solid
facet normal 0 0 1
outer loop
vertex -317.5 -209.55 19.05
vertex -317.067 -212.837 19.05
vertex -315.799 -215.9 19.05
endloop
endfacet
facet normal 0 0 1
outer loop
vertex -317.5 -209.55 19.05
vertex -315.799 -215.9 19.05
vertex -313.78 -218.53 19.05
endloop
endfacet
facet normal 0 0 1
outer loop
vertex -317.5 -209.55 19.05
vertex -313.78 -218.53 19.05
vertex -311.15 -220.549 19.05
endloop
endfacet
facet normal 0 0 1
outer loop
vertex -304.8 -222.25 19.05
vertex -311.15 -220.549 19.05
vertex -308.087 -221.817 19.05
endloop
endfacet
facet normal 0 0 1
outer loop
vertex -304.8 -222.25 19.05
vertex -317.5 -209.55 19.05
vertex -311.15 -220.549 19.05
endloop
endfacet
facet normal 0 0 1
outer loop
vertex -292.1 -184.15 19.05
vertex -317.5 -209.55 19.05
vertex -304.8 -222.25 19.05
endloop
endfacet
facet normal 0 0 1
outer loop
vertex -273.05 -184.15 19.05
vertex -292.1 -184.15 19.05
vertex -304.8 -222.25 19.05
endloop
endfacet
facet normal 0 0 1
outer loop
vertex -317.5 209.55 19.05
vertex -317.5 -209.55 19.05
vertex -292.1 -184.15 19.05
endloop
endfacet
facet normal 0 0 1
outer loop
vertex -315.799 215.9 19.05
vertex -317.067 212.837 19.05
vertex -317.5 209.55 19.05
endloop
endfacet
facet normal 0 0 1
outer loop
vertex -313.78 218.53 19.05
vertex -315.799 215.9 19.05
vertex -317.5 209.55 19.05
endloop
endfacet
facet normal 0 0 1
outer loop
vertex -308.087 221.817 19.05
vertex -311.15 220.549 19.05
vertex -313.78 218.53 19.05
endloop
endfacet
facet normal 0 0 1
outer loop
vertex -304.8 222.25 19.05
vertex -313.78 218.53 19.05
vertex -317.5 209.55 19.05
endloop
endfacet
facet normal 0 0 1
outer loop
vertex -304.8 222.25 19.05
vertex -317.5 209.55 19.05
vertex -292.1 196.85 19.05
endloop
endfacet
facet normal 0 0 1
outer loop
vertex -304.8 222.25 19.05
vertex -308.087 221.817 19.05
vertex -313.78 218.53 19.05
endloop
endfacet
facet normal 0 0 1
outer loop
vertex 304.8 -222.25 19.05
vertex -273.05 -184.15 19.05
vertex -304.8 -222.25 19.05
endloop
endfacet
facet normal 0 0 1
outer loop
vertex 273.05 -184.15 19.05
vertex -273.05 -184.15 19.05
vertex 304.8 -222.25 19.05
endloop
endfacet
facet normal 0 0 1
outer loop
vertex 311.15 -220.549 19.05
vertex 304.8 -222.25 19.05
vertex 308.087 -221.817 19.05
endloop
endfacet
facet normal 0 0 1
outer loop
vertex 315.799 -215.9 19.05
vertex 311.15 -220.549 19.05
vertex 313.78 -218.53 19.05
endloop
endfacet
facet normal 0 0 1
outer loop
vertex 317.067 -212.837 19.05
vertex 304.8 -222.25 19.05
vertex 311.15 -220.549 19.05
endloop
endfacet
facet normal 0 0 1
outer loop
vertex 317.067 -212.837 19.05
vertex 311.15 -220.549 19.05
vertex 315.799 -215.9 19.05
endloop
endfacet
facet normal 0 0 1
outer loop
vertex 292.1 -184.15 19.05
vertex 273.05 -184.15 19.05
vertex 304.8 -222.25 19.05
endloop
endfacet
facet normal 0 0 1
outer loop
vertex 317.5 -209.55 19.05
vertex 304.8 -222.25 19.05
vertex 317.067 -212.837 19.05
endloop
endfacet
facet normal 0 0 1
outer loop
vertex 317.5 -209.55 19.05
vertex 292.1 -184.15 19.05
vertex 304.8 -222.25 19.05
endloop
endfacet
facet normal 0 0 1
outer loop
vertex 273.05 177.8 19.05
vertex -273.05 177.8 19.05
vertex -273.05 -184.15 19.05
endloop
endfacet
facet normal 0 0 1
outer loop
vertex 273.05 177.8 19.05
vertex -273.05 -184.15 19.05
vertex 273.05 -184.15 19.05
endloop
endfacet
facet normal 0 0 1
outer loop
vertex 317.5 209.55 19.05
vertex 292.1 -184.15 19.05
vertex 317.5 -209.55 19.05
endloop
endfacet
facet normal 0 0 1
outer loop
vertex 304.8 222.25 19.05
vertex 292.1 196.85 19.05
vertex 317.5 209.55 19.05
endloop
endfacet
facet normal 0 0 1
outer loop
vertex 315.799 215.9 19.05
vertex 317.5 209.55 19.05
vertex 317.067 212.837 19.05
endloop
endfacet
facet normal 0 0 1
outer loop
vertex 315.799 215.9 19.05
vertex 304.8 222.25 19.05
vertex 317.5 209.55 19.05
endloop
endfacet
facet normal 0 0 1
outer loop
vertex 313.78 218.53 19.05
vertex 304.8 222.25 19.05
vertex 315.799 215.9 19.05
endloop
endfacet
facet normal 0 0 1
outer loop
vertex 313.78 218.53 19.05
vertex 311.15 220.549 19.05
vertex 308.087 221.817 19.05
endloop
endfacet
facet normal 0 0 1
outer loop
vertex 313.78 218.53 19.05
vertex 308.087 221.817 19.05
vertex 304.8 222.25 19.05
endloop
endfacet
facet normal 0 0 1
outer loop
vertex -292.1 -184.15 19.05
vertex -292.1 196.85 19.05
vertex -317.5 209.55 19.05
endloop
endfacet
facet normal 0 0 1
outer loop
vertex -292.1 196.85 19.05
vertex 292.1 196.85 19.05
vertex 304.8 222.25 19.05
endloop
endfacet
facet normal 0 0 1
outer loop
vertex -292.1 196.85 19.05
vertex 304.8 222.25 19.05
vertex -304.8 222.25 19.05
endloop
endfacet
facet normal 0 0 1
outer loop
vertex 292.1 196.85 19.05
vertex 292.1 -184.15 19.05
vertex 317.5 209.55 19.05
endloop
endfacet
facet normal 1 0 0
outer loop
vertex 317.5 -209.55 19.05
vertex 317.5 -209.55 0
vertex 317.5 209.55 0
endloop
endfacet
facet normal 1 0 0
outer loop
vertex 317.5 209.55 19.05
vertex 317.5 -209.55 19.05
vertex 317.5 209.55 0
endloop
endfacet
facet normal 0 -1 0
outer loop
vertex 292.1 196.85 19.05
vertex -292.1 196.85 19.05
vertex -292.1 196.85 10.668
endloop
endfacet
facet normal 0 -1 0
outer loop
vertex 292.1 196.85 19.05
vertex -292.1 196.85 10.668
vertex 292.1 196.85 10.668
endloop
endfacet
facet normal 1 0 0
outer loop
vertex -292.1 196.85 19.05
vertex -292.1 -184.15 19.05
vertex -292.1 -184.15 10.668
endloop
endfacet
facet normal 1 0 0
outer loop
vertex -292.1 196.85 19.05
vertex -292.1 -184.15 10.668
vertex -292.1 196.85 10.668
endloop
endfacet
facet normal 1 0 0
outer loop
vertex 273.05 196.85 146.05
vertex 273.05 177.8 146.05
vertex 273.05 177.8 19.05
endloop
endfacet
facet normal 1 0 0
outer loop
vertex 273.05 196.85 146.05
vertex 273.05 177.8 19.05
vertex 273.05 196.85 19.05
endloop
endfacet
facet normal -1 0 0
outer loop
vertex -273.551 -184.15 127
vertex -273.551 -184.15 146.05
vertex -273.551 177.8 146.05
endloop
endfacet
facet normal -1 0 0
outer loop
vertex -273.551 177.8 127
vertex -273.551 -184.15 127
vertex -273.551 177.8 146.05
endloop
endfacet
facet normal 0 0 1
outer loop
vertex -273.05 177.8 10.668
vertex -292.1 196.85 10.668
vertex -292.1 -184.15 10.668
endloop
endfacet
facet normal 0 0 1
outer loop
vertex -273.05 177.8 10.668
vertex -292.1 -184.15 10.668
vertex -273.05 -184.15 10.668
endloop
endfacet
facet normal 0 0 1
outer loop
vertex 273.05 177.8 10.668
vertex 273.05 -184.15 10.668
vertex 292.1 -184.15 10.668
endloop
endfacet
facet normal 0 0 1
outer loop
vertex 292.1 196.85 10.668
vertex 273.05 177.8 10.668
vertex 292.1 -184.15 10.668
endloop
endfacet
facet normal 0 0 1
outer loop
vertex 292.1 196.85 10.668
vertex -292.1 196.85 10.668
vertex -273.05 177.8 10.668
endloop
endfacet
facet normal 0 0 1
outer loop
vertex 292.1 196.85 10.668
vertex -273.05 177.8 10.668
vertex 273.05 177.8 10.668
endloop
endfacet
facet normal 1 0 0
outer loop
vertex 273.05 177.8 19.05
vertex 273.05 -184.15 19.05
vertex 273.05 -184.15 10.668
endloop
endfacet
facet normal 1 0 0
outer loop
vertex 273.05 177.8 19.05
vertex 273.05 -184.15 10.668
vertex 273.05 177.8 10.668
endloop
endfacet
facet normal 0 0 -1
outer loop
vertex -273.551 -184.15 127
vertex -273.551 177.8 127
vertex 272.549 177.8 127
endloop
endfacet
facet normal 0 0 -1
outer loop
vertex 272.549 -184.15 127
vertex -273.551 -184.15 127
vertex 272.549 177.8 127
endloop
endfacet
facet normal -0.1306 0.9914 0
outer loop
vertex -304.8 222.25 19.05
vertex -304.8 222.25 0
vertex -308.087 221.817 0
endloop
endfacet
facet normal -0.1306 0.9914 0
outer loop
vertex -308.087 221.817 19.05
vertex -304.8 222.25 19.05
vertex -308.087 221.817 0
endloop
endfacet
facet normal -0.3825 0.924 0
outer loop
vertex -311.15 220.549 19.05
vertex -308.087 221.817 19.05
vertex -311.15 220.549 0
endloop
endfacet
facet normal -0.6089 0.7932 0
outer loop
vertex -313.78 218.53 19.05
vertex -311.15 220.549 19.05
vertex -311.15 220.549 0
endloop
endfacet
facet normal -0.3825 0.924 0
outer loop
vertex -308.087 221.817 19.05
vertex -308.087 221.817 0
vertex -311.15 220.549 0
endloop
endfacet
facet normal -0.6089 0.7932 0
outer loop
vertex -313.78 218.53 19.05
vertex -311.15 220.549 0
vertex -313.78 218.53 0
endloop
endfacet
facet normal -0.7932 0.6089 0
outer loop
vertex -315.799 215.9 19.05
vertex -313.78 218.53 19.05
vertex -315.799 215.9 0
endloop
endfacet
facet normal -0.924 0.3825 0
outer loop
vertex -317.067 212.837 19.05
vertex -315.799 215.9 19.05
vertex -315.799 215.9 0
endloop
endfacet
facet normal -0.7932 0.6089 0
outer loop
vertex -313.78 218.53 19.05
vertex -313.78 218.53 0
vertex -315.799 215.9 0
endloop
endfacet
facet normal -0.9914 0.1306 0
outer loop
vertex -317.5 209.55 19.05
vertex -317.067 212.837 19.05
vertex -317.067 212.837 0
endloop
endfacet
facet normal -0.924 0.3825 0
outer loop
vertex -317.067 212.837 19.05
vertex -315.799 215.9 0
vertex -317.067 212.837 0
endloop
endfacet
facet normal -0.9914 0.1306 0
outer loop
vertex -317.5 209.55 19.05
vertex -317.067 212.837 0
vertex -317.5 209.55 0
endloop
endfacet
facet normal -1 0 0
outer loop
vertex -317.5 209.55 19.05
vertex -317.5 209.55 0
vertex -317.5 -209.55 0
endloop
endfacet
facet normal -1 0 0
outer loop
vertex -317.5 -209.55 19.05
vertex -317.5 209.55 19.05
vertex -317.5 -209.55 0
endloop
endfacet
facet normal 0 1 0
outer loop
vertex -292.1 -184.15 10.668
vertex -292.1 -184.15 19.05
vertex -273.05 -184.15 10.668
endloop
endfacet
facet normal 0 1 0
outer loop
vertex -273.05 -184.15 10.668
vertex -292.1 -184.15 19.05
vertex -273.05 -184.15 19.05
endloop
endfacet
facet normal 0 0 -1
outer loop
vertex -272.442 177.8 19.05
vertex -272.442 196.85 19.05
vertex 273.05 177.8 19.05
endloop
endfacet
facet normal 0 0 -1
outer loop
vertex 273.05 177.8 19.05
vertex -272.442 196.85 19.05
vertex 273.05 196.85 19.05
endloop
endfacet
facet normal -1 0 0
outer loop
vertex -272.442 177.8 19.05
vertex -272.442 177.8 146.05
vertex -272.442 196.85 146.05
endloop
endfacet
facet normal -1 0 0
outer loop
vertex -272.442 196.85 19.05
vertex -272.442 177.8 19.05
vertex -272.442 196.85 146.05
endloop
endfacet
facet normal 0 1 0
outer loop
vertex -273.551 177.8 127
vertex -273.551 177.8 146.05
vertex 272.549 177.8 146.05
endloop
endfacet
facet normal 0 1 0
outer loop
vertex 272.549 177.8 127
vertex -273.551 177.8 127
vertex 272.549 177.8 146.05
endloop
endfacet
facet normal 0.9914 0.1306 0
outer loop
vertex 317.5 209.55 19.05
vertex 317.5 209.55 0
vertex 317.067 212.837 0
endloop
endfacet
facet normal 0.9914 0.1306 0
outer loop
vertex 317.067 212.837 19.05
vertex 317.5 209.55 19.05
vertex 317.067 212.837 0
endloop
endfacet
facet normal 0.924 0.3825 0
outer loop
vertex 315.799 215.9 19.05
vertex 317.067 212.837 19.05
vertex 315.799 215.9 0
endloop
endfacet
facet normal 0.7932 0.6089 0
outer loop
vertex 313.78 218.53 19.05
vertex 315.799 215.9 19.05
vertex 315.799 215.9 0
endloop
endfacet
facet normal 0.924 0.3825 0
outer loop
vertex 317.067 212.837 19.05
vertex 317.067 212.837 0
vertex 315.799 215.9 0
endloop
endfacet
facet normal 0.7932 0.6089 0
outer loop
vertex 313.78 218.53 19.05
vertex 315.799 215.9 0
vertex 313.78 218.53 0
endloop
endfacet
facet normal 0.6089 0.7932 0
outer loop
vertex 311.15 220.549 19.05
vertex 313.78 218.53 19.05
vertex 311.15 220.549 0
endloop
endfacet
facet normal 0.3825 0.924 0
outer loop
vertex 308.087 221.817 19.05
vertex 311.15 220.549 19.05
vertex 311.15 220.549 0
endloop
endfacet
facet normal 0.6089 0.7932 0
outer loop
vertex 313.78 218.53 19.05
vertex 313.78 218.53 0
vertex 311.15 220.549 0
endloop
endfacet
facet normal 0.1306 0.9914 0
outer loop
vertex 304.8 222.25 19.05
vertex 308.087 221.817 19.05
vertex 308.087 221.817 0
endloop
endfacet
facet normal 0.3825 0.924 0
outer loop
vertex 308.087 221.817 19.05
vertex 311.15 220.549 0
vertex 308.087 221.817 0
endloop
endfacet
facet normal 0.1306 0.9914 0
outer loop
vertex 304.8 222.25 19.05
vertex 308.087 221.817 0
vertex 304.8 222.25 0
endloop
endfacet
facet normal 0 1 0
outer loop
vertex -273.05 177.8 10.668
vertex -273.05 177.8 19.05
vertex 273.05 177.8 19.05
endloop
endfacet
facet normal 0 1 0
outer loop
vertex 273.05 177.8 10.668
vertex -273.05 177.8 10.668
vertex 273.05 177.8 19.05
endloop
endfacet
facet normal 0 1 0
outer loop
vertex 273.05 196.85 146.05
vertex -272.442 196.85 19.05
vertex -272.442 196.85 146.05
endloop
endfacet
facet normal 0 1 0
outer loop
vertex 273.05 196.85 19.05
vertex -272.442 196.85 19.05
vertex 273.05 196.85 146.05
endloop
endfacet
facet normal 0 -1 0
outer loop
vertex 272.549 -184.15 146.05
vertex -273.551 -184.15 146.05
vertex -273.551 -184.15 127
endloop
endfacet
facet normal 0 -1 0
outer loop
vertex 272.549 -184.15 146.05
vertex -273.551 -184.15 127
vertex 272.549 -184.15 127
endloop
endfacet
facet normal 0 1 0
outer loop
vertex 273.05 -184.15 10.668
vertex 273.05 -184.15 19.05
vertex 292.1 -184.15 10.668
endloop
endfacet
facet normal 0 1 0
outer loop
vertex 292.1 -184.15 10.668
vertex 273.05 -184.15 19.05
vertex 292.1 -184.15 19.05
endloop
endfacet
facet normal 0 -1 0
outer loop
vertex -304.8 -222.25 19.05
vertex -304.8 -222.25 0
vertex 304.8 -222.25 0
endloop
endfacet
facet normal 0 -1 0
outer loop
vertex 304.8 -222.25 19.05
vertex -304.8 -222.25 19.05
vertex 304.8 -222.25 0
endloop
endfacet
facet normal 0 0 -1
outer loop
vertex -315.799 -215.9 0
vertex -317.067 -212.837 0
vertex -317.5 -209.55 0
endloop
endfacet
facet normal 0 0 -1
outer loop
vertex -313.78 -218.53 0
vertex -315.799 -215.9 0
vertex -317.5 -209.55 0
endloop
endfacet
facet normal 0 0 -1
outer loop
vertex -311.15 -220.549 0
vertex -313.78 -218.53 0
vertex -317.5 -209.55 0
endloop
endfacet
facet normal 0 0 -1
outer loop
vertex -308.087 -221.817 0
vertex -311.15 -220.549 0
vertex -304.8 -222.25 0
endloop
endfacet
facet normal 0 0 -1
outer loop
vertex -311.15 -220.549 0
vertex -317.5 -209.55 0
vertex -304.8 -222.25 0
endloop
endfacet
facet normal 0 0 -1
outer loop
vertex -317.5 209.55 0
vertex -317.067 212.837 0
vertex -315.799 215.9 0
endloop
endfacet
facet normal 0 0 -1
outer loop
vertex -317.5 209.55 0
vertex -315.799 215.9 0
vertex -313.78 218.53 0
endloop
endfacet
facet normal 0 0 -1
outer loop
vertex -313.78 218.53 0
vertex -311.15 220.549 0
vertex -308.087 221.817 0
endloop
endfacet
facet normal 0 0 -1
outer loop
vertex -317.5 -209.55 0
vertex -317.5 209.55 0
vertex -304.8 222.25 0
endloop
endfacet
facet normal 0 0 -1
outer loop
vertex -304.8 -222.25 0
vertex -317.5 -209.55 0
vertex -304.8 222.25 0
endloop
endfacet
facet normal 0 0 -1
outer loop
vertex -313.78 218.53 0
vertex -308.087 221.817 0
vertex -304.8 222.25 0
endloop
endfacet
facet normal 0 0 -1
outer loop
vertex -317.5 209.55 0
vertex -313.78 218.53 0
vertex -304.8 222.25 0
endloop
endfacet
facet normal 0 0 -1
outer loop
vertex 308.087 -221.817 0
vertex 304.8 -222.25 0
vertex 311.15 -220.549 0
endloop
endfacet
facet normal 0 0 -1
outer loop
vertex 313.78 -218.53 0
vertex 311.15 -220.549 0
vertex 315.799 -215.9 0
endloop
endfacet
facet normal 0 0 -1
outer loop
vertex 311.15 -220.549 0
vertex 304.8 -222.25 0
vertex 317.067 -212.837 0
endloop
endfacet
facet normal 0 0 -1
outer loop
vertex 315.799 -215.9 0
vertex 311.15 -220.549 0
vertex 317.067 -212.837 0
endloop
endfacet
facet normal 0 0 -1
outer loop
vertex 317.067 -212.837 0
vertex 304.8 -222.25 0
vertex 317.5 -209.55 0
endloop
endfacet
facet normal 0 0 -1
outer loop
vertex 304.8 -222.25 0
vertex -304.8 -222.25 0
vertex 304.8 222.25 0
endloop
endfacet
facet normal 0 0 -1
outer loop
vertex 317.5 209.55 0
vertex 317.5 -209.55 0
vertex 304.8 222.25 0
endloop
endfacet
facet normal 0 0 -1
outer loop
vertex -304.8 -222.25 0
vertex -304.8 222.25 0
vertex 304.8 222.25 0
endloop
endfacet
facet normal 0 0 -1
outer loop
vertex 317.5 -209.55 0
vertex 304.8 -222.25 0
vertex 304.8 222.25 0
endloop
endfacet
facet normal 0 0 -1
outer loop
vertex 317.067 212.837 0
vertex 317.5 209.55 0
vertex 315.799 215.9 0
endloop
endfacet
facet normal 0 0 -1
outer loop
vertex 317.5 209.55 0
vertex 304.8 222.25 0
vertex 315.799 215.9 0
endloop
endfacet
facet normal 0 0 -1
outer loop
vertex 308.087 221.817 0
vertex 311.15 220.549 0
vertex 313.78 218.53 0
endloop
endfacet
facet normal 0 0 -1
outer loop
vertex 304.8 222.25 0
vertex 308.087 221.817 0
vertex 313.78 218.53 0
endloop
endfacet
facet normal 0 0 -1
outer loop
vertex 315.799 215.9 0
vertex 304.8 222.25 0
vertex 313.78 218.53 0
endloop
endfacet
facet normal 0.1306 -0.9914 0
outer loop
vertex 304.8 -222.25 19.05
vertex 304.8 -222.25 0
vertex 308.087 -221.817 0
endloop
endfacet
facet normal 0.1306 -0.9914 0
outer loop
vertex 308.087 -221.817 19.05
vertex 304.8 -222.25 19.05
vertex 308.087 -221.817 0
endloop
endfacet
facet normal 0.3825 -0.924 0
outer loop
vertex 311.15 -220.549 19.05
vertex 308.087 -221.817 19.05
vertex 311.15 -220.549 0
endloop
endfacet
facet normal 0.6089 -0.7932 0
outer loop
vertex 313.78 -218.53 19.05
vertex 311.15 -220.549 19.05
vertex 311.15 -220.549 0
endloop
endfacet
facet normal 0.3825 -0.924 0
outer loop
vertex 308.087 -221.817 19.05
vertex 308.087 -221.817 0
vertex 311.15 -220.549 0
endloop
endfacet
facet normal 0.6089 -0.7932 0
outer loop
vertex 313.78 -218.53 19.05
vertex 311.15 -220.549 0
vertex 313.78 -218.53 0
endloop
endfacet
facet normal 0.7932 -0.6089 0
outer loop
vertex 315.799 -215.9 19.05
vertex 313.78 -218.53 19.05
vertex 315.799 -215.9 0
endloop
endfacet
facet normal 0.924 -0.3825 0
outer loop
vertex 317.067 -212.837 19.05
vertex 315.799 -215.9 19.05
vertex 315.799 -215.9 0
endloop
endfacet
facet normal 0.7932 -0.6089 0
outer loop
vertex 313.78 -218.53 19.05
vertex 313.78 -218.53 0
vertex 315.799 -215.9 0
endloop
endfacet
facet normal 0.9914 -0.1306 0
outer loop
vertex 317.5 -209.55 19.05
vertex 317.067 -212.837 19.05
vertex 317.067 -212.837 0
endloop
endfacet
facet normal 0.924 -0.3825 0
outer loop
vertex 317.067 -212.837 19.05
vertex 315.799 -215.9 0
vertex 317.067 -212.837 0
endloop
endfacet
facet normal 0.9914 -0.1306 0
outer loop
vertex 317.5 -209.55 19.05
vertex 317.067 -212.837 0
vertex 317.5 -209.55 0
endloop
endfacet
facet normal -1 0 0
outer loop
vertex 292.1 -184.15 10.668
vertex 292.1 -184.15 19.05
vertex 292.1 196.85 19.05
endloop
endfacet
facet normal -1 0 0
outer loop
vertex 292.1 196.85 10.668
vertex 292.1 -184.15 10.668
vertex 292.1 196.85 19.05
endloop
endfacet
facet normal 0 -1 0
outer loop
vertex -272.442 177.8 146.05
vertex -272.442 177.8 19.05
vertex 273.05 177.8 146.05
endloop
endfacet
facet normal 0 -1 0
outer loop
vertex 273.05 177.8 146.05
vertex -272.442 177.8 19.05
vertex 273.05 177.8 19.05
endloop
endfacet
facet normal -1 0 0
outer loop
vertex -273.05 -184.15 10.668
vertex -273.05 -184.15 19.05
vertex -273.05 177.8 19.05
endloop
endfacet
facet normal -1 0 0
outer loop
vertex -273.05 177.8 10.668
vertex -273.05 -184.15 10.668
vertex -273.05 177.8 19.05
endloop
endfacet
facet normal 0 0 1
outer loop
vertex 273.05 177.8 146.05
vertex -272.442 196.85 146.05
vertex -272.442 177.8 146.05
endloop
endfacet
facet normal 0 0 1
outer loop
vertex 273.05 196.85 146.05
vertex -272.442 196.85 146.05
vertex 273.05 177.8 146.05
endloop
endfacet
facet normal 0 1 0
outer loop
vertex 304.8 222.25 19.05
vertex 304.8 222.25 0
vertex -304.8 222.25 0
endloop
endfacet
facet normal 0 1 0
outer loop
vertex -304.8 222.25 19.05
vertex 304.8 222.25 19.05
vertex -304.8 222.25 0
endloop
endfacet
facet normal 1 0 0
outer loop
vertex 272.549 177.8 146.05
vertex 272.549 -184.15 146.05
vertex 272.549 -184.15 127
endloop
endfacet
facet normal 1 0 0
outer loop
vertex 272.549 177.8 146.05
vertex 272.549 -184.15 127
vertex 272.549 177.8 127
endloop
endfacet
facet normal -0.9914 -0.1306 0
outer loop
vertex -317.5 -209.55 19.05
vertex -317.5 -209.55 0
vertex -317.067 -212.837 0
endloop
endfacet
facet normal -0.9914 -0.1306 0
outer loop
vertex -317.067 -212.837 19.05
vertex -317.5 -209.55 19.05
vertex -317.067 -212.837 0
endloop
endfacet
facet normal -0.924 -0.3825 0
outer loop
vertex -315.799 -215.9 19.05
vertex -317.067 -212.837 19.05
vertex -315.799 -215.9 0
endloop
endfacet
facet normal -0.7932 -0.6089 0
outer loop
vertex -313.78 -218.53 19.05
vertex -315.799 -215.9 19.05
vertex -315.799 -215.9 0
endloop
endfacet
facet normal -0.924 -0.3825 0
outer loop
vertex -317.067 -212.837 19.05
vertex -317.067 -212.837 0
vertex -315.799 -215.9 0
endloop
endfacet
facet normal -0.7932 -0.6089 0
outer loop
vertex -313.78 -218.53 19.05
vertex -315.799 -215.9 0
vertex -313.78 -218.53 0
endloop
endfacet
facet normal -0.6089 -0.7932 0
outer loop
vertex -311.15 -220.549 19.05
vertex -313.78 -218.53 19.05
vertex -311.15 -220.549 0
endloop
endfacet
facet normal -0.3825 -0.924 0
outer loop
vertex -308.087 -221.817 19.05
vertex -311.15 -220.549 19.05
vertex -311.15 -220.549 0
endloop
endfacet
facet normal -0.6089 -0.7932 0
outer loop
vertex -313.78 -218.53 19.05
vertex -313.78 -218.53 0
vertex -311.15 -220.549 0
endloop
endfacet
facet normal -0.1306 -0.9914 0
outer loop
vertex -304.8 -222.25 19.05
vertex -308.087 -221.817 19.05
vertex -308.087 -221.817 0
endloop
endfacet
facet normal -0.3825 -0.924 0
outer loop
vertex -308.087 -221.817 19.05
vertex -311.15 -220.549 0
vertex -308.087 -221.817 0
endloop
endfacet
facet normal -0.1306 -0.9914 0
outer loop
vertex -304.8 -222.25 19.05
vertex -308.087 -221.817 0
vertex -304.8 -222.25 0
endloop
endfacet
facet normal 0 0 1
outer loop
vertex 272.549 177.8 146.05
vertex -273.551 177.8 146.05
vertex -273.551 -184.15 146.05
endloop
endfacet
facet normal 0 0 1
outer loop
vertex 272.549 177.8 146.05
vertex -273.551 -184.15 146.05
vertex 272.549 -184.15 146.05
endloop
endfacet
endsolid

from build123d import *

# Parameters (mm, degrees)
F1_DEPTH  = 19.05
F2_W      = 584.2
F2_H      = 19.05
F3_DEPTH  = 8.382
F4_W      = 19.05
F4_H      = 361.95
F5_DEPTH  = 8.382
F6_W      = 19.05
F6_H      = 361.95
F7_DEPTH  = 8.382
F8_W      = 545.492311
F8_H      = 19.05
F9_DEPTH  = 127
F10_W     = 546.1
F10_H     = 361.95
F11_DEPTH = 19.05


with BuildPart() as f1:
    # F0 (on Top) → F1 (new body)
    with BuildSketch(Plane.XY):
        with BuildLine():
            Line((304.8, 222.25), (-304.8, 222.25))
            ThreePointArc((-304.8, 222.25), (-313.780256, 218.530256), (-317.5, 209.55))
            Line((-317.5, 209.55), (-317.5, -209.55))
            ThreePointArc((-317.5, -209.55), (-313.780256, -218.530256), (-304.8, -222.25))
            Line((-304.8, -222.25), (304.8, -222.25))
            ThreePointArc((304.8, -222.25), (313.780256, -218.530256), (317.5, -209.55))
            Line((317.5, -209.55), (317.5, 209.55))
            ThreePointArc((317.5, 209.55), (313.780256, 218.530256), (304.8, 222.25))
        make_face()
    extrude(amount=F1_DEPTH)

    # F2 (on face) → F3 (cut)
    with BuildSketch(Plane.XY.offset(19.05)):
        with Locations((0, 187.325)):
            Rectangle(F2_W, F2_H)
    extrude(amount=-F3_DEPTH, mode=Mode.SUBTRACT)

    # F4 (on face) → F5 (cut)
    with BuildSketch(Plane.XY.offset(19.05)):
        with Locations((-282.575, -3.175)):
            Rectangle(F4_W, F4_H)
    extrude(amount=-F5_DEPTH, mode=Mode.SUBTRACT)

    # F6 (on face) → F7 (cut)
    with BuildSketch(Plane.XY.offset(19.05)):
        with Locations((282.575, -3.175)):
            Rectangle(F6_W, F6_H)
    extrude(amount=-F7_DEPTH, mode=Mode.SUBTRACT)


with BuildPart() as f9:
    # F8 (on face) → F9 (new body)
    with BuildSketch(Plane.XY.offset(19.05)):
        with Locations((0.303845, 187.325)):
            Rectangle(F8_W, F8_H)
    extrude(amount=F9_DEPTH)


with BuildPart() as f11:
    # F10 (on face) → F11 (new body)
    with BuildSketch(Plane.XY.offset(146.05)):
        with Locations((-0.50051, -3.175)):
            Rectangle(F10_W, F10_H)
    extrude(amount=-F11_DEPTH)


solid = Compound([f1.part, f9.part, f11.part])
